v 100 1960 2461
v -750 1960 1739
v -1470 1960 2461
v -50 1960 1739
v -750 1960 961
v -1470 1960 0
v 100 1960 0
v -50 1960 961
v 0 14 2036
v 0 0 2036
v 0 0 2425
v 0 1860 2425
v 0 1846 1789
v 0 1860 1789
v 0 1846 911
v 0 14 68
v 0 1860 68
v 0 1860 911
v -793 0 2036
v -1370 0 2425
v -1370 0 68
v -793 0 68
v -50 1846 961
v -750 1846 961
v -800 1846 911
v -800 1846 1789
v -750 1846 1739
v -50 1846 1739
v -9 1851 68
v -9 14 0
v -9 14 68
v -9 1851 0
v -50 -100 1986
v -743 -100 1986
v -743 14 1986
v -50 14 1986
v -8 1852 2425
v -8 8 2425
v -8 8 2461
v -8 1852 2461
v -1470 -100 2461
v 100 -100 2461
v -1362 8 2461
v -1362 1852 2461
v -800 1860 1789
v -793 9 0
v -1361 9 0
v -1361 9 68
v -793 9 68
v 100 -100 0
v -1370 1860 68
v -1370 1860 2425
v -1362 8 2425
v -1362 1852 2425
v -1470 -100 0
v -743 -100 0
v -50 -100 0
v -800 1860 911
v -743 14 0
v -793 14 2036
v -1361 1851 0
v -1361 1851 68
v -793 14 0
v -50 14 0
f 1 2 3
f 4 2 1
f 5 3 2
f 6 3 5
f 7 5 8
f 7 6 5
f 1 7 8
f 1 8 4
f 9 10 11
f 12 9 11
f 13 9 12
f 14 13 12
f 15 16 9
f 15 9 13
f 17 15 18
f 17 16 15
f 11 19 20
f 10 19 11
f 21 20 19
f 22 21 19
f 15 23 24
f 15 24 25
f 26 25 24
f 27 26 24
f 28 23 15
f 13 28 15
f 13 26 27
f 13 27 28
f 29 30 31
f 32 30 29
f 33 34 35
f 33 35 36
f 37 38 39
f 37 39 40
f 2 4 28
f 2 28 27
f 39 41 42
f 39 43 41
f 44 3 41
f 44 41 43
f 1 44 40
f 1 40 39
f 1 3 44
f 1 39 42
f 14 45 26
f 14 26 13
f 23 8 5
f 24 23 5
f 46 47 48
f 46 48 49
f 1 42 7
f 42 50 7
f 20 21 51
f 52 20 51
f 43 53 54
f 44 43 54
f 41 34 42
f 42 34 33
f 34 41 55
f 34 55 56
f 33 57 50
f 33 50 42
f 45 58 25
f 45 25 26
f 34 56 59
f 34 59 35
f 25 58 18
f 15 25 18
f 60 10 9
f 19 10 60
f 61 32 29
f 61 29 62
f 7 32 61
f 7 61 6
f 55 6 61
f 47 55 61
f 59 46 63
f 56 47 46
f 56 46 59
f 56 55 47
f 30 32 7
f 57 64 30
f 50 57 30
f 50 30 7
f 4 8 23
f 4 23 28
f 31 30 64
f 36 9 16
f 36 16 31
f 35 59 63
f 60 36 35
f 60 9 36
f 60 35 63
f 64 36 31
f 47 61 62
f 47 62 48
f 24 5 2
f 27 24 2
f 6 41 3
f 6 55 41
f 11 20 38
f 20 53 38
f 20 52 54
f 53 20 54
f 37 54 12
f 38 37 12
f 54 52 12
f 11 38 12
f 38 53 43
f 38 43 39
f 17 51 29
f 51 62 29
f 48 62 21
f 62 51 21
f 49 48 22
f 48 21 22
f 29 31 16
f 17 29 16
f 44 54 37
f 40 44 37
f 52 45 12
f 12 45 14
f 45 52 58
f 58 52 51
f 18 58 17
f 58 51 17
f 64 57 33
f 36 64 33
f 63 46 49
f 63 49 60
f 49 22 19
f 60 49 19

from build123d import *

# Parameters (mm, degrees)
F0_W      = 1570
F0_H      = 2060
F0_W_2    = 1370
F0_H_2    = 1860
F1_DEPTH  = 2425
F2_W      = 793
F2_H      = 2036
F3_DEPTH  = 14
F4_W      = 693
F4_H      = 1986
F5_DEPTH  = 114
F6_W      = 800
F6_H      = 878
F7_DEPTH  = 14
F8_W      = 700
F8_H      = 778
F9_DEPTH  = 114
F11_DEPTH = 68
F12_W     = 1570
F12_H     = 2060
F12_W_2   = 1354
F12_H_2   = 1844
F13_DEPTH = 36


with BuildPart() as f1:
    # F0 (on Top) → F1 (new body)
    with BuildSketch(Plane.XY):
        with Locations((-685, 930)):
            Rectangle(F0_W, F0_H)
        with Locations((-685, 930)):
            Rectangle(F0_W_2, F0_H_2, mode=Mode.SUBTRACT)
    extrude(amount=F1_DEPTH)

    # F2 (on face) → F3 (join)
    with BuildSketch(Plane(origin=(0, 0, 0), x_dir=(-1, 0, 0), z_dir=(0, 1, 0))):
        with Locations((396.5, 1018)):
            Rectangle(F2_W, F2_H)
    extrude(amount=F3_DEPTH)

    # F4 (on face) → F5 (cut, through all)
    with BuildSketch(Plane.XZ.offset(100)):
        with Locations((-396.5, 993)):
            Rectangle(F4_W, F4_H)
    extrude(amount=-F5_DEPTH, mode=Mode.SUBTRACT)

    # F6 (on face) → F7 (join)
    with BuildSketch(Plane.XZ.offset(-1860)):
        with Locations((-400, 1350)):
            Rectangle(F6_W, F6_H)
    extrude(amount=F7_DEPTH)

    # F8 (on face) → F9 (cut, through all)
    with BuildSketch(Plane(origin=(0, 1960, 0), x_dir=(-1, 0, 0), z_dir=(0, 1, 0))):
        with Locations((400, 1350)):
            Rectangle(F8_W, F8_H)
    extrude(amount=-F9_DEPTH, mode=Mode.SUBTRACT)

    # F10 (on face) → F11 (join)
    with BuildSketch(Plane(origin=(0, 0, 0), x_dir=(1, 0, 0), z_dir=(0, 0, -1))):
        Polygon((-1361, -1851), (-1361, -9), (-743, -9), (-743, 0), (-1370, 0), (-1370, -1860), (0, -1860), (0, -14), (-9, -14), (-9, -1851), align=None)
    extrude(amount=-F11_DEPTH)

    # F12 (on face) → F13 (join)
    with BuildSketch(Plane.XY.offset(2425)):
        with Locations((-685, 930)):
            Rectangle(F12_W, F12_H)
        with Locations((-685, 930)):
            Rectangle(F12_W_2, F12_H_2, mode=Mode.SUBTRACT)
    extrude(amount=F13_DEPTH)


solid = f1.part
